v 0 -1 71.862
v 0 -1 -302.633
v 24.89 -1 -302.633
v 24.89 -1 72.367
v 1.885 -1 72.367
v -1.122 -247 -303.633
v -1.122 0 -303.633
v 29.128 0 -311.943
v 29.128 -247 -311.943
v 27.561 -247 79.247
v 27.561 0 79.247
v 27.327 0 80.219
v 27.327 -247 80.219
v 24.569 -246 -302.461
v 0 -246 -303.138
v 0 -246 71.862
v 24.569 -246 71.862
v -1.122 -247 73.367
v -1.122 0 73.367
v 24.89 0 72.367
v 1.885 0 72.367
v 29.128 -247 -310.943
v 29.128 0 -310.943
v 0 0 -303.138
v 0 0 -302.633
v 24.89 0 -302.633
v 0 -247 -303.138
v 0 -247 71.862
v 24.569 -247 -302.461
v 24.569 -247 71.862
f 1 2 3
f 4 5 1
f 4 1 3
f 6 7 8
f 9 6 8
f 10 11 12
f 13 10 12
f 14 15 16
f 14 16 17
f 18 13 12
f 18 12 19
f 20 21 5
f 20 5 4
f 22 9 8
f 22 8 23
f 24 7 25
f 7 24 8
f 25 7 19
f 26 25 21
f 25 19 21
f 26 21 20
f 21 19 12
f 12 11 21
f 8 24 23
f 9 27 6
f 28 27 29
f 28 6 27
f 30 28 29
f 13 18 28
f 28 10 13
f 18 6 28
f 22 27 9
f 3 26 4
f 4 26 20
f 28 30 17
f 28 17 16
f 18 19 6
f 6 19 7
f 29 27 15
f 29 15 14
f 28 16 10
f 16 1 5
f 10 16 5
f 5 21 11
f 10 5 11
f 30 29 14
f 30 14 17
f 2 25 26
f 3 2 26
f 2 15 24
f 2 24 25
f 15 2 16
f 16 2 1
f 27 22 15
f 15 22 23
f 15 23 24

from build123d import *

# Parameters (mm, degrees)
F1_DEPTH = 247
F2_W     = 25
F2_H     = 1
F3_DEPTH = 1
F2_H_2   = 374
F4_DEPTH = 1
F6_DEPTH = 1


# Not quite as in the source:
# - a feature names something its author has since deleted; it is built from what else it names


with BuildPart() as f1:
    # F0 (on Front) → F1 (new body)
    with BuildSketch(Plane.XZ):
        Polygon((-1.1216281516, 73.3666580543), (-1.1216281516, 72.3666580543), (-1.1216281516, -302.6333419457), (-1.1216281516, -303.6333419457), (29.1284304133, -311.9432493216), (29.1284304133, -310.9432493216), (0, -303.1383099156), (0, 71.8616900844), (27.561313438, 79.2467217624), (27.3271471585, 80.2189183236), align=None)
    extrude(amount=F1_DEPTH)

    # F2 (on Front) → F3 (join)
    with BuildSketch(Plane.XZ):
        with Locations((12.390091487, 71.8666580543)):
            Rectangle(F2_W, F2_H)
    extrude(amount=F3_DEPTH)

    # F2 (on Front) → F4 (join)
    with BuildSketch(Plane.XZ):
        with Locations((12.390091487, -115.6333419457)):
            Rectangle(F2_W, F2_H_2)
    extrude(amount=F4_DEPTH)

    # F5 (on face) → F6 (join)
    with BuildSketch(Plane.XZ.offset(247)):
        Polygon((24.5685894042, 71.8616900844), (0, 71.8616900844), (0, -303.1383099156), (24.5685894042, -302.4606704712), align=None)
    extrude(amount=-F6_DEPTH)


solid = f1.part
